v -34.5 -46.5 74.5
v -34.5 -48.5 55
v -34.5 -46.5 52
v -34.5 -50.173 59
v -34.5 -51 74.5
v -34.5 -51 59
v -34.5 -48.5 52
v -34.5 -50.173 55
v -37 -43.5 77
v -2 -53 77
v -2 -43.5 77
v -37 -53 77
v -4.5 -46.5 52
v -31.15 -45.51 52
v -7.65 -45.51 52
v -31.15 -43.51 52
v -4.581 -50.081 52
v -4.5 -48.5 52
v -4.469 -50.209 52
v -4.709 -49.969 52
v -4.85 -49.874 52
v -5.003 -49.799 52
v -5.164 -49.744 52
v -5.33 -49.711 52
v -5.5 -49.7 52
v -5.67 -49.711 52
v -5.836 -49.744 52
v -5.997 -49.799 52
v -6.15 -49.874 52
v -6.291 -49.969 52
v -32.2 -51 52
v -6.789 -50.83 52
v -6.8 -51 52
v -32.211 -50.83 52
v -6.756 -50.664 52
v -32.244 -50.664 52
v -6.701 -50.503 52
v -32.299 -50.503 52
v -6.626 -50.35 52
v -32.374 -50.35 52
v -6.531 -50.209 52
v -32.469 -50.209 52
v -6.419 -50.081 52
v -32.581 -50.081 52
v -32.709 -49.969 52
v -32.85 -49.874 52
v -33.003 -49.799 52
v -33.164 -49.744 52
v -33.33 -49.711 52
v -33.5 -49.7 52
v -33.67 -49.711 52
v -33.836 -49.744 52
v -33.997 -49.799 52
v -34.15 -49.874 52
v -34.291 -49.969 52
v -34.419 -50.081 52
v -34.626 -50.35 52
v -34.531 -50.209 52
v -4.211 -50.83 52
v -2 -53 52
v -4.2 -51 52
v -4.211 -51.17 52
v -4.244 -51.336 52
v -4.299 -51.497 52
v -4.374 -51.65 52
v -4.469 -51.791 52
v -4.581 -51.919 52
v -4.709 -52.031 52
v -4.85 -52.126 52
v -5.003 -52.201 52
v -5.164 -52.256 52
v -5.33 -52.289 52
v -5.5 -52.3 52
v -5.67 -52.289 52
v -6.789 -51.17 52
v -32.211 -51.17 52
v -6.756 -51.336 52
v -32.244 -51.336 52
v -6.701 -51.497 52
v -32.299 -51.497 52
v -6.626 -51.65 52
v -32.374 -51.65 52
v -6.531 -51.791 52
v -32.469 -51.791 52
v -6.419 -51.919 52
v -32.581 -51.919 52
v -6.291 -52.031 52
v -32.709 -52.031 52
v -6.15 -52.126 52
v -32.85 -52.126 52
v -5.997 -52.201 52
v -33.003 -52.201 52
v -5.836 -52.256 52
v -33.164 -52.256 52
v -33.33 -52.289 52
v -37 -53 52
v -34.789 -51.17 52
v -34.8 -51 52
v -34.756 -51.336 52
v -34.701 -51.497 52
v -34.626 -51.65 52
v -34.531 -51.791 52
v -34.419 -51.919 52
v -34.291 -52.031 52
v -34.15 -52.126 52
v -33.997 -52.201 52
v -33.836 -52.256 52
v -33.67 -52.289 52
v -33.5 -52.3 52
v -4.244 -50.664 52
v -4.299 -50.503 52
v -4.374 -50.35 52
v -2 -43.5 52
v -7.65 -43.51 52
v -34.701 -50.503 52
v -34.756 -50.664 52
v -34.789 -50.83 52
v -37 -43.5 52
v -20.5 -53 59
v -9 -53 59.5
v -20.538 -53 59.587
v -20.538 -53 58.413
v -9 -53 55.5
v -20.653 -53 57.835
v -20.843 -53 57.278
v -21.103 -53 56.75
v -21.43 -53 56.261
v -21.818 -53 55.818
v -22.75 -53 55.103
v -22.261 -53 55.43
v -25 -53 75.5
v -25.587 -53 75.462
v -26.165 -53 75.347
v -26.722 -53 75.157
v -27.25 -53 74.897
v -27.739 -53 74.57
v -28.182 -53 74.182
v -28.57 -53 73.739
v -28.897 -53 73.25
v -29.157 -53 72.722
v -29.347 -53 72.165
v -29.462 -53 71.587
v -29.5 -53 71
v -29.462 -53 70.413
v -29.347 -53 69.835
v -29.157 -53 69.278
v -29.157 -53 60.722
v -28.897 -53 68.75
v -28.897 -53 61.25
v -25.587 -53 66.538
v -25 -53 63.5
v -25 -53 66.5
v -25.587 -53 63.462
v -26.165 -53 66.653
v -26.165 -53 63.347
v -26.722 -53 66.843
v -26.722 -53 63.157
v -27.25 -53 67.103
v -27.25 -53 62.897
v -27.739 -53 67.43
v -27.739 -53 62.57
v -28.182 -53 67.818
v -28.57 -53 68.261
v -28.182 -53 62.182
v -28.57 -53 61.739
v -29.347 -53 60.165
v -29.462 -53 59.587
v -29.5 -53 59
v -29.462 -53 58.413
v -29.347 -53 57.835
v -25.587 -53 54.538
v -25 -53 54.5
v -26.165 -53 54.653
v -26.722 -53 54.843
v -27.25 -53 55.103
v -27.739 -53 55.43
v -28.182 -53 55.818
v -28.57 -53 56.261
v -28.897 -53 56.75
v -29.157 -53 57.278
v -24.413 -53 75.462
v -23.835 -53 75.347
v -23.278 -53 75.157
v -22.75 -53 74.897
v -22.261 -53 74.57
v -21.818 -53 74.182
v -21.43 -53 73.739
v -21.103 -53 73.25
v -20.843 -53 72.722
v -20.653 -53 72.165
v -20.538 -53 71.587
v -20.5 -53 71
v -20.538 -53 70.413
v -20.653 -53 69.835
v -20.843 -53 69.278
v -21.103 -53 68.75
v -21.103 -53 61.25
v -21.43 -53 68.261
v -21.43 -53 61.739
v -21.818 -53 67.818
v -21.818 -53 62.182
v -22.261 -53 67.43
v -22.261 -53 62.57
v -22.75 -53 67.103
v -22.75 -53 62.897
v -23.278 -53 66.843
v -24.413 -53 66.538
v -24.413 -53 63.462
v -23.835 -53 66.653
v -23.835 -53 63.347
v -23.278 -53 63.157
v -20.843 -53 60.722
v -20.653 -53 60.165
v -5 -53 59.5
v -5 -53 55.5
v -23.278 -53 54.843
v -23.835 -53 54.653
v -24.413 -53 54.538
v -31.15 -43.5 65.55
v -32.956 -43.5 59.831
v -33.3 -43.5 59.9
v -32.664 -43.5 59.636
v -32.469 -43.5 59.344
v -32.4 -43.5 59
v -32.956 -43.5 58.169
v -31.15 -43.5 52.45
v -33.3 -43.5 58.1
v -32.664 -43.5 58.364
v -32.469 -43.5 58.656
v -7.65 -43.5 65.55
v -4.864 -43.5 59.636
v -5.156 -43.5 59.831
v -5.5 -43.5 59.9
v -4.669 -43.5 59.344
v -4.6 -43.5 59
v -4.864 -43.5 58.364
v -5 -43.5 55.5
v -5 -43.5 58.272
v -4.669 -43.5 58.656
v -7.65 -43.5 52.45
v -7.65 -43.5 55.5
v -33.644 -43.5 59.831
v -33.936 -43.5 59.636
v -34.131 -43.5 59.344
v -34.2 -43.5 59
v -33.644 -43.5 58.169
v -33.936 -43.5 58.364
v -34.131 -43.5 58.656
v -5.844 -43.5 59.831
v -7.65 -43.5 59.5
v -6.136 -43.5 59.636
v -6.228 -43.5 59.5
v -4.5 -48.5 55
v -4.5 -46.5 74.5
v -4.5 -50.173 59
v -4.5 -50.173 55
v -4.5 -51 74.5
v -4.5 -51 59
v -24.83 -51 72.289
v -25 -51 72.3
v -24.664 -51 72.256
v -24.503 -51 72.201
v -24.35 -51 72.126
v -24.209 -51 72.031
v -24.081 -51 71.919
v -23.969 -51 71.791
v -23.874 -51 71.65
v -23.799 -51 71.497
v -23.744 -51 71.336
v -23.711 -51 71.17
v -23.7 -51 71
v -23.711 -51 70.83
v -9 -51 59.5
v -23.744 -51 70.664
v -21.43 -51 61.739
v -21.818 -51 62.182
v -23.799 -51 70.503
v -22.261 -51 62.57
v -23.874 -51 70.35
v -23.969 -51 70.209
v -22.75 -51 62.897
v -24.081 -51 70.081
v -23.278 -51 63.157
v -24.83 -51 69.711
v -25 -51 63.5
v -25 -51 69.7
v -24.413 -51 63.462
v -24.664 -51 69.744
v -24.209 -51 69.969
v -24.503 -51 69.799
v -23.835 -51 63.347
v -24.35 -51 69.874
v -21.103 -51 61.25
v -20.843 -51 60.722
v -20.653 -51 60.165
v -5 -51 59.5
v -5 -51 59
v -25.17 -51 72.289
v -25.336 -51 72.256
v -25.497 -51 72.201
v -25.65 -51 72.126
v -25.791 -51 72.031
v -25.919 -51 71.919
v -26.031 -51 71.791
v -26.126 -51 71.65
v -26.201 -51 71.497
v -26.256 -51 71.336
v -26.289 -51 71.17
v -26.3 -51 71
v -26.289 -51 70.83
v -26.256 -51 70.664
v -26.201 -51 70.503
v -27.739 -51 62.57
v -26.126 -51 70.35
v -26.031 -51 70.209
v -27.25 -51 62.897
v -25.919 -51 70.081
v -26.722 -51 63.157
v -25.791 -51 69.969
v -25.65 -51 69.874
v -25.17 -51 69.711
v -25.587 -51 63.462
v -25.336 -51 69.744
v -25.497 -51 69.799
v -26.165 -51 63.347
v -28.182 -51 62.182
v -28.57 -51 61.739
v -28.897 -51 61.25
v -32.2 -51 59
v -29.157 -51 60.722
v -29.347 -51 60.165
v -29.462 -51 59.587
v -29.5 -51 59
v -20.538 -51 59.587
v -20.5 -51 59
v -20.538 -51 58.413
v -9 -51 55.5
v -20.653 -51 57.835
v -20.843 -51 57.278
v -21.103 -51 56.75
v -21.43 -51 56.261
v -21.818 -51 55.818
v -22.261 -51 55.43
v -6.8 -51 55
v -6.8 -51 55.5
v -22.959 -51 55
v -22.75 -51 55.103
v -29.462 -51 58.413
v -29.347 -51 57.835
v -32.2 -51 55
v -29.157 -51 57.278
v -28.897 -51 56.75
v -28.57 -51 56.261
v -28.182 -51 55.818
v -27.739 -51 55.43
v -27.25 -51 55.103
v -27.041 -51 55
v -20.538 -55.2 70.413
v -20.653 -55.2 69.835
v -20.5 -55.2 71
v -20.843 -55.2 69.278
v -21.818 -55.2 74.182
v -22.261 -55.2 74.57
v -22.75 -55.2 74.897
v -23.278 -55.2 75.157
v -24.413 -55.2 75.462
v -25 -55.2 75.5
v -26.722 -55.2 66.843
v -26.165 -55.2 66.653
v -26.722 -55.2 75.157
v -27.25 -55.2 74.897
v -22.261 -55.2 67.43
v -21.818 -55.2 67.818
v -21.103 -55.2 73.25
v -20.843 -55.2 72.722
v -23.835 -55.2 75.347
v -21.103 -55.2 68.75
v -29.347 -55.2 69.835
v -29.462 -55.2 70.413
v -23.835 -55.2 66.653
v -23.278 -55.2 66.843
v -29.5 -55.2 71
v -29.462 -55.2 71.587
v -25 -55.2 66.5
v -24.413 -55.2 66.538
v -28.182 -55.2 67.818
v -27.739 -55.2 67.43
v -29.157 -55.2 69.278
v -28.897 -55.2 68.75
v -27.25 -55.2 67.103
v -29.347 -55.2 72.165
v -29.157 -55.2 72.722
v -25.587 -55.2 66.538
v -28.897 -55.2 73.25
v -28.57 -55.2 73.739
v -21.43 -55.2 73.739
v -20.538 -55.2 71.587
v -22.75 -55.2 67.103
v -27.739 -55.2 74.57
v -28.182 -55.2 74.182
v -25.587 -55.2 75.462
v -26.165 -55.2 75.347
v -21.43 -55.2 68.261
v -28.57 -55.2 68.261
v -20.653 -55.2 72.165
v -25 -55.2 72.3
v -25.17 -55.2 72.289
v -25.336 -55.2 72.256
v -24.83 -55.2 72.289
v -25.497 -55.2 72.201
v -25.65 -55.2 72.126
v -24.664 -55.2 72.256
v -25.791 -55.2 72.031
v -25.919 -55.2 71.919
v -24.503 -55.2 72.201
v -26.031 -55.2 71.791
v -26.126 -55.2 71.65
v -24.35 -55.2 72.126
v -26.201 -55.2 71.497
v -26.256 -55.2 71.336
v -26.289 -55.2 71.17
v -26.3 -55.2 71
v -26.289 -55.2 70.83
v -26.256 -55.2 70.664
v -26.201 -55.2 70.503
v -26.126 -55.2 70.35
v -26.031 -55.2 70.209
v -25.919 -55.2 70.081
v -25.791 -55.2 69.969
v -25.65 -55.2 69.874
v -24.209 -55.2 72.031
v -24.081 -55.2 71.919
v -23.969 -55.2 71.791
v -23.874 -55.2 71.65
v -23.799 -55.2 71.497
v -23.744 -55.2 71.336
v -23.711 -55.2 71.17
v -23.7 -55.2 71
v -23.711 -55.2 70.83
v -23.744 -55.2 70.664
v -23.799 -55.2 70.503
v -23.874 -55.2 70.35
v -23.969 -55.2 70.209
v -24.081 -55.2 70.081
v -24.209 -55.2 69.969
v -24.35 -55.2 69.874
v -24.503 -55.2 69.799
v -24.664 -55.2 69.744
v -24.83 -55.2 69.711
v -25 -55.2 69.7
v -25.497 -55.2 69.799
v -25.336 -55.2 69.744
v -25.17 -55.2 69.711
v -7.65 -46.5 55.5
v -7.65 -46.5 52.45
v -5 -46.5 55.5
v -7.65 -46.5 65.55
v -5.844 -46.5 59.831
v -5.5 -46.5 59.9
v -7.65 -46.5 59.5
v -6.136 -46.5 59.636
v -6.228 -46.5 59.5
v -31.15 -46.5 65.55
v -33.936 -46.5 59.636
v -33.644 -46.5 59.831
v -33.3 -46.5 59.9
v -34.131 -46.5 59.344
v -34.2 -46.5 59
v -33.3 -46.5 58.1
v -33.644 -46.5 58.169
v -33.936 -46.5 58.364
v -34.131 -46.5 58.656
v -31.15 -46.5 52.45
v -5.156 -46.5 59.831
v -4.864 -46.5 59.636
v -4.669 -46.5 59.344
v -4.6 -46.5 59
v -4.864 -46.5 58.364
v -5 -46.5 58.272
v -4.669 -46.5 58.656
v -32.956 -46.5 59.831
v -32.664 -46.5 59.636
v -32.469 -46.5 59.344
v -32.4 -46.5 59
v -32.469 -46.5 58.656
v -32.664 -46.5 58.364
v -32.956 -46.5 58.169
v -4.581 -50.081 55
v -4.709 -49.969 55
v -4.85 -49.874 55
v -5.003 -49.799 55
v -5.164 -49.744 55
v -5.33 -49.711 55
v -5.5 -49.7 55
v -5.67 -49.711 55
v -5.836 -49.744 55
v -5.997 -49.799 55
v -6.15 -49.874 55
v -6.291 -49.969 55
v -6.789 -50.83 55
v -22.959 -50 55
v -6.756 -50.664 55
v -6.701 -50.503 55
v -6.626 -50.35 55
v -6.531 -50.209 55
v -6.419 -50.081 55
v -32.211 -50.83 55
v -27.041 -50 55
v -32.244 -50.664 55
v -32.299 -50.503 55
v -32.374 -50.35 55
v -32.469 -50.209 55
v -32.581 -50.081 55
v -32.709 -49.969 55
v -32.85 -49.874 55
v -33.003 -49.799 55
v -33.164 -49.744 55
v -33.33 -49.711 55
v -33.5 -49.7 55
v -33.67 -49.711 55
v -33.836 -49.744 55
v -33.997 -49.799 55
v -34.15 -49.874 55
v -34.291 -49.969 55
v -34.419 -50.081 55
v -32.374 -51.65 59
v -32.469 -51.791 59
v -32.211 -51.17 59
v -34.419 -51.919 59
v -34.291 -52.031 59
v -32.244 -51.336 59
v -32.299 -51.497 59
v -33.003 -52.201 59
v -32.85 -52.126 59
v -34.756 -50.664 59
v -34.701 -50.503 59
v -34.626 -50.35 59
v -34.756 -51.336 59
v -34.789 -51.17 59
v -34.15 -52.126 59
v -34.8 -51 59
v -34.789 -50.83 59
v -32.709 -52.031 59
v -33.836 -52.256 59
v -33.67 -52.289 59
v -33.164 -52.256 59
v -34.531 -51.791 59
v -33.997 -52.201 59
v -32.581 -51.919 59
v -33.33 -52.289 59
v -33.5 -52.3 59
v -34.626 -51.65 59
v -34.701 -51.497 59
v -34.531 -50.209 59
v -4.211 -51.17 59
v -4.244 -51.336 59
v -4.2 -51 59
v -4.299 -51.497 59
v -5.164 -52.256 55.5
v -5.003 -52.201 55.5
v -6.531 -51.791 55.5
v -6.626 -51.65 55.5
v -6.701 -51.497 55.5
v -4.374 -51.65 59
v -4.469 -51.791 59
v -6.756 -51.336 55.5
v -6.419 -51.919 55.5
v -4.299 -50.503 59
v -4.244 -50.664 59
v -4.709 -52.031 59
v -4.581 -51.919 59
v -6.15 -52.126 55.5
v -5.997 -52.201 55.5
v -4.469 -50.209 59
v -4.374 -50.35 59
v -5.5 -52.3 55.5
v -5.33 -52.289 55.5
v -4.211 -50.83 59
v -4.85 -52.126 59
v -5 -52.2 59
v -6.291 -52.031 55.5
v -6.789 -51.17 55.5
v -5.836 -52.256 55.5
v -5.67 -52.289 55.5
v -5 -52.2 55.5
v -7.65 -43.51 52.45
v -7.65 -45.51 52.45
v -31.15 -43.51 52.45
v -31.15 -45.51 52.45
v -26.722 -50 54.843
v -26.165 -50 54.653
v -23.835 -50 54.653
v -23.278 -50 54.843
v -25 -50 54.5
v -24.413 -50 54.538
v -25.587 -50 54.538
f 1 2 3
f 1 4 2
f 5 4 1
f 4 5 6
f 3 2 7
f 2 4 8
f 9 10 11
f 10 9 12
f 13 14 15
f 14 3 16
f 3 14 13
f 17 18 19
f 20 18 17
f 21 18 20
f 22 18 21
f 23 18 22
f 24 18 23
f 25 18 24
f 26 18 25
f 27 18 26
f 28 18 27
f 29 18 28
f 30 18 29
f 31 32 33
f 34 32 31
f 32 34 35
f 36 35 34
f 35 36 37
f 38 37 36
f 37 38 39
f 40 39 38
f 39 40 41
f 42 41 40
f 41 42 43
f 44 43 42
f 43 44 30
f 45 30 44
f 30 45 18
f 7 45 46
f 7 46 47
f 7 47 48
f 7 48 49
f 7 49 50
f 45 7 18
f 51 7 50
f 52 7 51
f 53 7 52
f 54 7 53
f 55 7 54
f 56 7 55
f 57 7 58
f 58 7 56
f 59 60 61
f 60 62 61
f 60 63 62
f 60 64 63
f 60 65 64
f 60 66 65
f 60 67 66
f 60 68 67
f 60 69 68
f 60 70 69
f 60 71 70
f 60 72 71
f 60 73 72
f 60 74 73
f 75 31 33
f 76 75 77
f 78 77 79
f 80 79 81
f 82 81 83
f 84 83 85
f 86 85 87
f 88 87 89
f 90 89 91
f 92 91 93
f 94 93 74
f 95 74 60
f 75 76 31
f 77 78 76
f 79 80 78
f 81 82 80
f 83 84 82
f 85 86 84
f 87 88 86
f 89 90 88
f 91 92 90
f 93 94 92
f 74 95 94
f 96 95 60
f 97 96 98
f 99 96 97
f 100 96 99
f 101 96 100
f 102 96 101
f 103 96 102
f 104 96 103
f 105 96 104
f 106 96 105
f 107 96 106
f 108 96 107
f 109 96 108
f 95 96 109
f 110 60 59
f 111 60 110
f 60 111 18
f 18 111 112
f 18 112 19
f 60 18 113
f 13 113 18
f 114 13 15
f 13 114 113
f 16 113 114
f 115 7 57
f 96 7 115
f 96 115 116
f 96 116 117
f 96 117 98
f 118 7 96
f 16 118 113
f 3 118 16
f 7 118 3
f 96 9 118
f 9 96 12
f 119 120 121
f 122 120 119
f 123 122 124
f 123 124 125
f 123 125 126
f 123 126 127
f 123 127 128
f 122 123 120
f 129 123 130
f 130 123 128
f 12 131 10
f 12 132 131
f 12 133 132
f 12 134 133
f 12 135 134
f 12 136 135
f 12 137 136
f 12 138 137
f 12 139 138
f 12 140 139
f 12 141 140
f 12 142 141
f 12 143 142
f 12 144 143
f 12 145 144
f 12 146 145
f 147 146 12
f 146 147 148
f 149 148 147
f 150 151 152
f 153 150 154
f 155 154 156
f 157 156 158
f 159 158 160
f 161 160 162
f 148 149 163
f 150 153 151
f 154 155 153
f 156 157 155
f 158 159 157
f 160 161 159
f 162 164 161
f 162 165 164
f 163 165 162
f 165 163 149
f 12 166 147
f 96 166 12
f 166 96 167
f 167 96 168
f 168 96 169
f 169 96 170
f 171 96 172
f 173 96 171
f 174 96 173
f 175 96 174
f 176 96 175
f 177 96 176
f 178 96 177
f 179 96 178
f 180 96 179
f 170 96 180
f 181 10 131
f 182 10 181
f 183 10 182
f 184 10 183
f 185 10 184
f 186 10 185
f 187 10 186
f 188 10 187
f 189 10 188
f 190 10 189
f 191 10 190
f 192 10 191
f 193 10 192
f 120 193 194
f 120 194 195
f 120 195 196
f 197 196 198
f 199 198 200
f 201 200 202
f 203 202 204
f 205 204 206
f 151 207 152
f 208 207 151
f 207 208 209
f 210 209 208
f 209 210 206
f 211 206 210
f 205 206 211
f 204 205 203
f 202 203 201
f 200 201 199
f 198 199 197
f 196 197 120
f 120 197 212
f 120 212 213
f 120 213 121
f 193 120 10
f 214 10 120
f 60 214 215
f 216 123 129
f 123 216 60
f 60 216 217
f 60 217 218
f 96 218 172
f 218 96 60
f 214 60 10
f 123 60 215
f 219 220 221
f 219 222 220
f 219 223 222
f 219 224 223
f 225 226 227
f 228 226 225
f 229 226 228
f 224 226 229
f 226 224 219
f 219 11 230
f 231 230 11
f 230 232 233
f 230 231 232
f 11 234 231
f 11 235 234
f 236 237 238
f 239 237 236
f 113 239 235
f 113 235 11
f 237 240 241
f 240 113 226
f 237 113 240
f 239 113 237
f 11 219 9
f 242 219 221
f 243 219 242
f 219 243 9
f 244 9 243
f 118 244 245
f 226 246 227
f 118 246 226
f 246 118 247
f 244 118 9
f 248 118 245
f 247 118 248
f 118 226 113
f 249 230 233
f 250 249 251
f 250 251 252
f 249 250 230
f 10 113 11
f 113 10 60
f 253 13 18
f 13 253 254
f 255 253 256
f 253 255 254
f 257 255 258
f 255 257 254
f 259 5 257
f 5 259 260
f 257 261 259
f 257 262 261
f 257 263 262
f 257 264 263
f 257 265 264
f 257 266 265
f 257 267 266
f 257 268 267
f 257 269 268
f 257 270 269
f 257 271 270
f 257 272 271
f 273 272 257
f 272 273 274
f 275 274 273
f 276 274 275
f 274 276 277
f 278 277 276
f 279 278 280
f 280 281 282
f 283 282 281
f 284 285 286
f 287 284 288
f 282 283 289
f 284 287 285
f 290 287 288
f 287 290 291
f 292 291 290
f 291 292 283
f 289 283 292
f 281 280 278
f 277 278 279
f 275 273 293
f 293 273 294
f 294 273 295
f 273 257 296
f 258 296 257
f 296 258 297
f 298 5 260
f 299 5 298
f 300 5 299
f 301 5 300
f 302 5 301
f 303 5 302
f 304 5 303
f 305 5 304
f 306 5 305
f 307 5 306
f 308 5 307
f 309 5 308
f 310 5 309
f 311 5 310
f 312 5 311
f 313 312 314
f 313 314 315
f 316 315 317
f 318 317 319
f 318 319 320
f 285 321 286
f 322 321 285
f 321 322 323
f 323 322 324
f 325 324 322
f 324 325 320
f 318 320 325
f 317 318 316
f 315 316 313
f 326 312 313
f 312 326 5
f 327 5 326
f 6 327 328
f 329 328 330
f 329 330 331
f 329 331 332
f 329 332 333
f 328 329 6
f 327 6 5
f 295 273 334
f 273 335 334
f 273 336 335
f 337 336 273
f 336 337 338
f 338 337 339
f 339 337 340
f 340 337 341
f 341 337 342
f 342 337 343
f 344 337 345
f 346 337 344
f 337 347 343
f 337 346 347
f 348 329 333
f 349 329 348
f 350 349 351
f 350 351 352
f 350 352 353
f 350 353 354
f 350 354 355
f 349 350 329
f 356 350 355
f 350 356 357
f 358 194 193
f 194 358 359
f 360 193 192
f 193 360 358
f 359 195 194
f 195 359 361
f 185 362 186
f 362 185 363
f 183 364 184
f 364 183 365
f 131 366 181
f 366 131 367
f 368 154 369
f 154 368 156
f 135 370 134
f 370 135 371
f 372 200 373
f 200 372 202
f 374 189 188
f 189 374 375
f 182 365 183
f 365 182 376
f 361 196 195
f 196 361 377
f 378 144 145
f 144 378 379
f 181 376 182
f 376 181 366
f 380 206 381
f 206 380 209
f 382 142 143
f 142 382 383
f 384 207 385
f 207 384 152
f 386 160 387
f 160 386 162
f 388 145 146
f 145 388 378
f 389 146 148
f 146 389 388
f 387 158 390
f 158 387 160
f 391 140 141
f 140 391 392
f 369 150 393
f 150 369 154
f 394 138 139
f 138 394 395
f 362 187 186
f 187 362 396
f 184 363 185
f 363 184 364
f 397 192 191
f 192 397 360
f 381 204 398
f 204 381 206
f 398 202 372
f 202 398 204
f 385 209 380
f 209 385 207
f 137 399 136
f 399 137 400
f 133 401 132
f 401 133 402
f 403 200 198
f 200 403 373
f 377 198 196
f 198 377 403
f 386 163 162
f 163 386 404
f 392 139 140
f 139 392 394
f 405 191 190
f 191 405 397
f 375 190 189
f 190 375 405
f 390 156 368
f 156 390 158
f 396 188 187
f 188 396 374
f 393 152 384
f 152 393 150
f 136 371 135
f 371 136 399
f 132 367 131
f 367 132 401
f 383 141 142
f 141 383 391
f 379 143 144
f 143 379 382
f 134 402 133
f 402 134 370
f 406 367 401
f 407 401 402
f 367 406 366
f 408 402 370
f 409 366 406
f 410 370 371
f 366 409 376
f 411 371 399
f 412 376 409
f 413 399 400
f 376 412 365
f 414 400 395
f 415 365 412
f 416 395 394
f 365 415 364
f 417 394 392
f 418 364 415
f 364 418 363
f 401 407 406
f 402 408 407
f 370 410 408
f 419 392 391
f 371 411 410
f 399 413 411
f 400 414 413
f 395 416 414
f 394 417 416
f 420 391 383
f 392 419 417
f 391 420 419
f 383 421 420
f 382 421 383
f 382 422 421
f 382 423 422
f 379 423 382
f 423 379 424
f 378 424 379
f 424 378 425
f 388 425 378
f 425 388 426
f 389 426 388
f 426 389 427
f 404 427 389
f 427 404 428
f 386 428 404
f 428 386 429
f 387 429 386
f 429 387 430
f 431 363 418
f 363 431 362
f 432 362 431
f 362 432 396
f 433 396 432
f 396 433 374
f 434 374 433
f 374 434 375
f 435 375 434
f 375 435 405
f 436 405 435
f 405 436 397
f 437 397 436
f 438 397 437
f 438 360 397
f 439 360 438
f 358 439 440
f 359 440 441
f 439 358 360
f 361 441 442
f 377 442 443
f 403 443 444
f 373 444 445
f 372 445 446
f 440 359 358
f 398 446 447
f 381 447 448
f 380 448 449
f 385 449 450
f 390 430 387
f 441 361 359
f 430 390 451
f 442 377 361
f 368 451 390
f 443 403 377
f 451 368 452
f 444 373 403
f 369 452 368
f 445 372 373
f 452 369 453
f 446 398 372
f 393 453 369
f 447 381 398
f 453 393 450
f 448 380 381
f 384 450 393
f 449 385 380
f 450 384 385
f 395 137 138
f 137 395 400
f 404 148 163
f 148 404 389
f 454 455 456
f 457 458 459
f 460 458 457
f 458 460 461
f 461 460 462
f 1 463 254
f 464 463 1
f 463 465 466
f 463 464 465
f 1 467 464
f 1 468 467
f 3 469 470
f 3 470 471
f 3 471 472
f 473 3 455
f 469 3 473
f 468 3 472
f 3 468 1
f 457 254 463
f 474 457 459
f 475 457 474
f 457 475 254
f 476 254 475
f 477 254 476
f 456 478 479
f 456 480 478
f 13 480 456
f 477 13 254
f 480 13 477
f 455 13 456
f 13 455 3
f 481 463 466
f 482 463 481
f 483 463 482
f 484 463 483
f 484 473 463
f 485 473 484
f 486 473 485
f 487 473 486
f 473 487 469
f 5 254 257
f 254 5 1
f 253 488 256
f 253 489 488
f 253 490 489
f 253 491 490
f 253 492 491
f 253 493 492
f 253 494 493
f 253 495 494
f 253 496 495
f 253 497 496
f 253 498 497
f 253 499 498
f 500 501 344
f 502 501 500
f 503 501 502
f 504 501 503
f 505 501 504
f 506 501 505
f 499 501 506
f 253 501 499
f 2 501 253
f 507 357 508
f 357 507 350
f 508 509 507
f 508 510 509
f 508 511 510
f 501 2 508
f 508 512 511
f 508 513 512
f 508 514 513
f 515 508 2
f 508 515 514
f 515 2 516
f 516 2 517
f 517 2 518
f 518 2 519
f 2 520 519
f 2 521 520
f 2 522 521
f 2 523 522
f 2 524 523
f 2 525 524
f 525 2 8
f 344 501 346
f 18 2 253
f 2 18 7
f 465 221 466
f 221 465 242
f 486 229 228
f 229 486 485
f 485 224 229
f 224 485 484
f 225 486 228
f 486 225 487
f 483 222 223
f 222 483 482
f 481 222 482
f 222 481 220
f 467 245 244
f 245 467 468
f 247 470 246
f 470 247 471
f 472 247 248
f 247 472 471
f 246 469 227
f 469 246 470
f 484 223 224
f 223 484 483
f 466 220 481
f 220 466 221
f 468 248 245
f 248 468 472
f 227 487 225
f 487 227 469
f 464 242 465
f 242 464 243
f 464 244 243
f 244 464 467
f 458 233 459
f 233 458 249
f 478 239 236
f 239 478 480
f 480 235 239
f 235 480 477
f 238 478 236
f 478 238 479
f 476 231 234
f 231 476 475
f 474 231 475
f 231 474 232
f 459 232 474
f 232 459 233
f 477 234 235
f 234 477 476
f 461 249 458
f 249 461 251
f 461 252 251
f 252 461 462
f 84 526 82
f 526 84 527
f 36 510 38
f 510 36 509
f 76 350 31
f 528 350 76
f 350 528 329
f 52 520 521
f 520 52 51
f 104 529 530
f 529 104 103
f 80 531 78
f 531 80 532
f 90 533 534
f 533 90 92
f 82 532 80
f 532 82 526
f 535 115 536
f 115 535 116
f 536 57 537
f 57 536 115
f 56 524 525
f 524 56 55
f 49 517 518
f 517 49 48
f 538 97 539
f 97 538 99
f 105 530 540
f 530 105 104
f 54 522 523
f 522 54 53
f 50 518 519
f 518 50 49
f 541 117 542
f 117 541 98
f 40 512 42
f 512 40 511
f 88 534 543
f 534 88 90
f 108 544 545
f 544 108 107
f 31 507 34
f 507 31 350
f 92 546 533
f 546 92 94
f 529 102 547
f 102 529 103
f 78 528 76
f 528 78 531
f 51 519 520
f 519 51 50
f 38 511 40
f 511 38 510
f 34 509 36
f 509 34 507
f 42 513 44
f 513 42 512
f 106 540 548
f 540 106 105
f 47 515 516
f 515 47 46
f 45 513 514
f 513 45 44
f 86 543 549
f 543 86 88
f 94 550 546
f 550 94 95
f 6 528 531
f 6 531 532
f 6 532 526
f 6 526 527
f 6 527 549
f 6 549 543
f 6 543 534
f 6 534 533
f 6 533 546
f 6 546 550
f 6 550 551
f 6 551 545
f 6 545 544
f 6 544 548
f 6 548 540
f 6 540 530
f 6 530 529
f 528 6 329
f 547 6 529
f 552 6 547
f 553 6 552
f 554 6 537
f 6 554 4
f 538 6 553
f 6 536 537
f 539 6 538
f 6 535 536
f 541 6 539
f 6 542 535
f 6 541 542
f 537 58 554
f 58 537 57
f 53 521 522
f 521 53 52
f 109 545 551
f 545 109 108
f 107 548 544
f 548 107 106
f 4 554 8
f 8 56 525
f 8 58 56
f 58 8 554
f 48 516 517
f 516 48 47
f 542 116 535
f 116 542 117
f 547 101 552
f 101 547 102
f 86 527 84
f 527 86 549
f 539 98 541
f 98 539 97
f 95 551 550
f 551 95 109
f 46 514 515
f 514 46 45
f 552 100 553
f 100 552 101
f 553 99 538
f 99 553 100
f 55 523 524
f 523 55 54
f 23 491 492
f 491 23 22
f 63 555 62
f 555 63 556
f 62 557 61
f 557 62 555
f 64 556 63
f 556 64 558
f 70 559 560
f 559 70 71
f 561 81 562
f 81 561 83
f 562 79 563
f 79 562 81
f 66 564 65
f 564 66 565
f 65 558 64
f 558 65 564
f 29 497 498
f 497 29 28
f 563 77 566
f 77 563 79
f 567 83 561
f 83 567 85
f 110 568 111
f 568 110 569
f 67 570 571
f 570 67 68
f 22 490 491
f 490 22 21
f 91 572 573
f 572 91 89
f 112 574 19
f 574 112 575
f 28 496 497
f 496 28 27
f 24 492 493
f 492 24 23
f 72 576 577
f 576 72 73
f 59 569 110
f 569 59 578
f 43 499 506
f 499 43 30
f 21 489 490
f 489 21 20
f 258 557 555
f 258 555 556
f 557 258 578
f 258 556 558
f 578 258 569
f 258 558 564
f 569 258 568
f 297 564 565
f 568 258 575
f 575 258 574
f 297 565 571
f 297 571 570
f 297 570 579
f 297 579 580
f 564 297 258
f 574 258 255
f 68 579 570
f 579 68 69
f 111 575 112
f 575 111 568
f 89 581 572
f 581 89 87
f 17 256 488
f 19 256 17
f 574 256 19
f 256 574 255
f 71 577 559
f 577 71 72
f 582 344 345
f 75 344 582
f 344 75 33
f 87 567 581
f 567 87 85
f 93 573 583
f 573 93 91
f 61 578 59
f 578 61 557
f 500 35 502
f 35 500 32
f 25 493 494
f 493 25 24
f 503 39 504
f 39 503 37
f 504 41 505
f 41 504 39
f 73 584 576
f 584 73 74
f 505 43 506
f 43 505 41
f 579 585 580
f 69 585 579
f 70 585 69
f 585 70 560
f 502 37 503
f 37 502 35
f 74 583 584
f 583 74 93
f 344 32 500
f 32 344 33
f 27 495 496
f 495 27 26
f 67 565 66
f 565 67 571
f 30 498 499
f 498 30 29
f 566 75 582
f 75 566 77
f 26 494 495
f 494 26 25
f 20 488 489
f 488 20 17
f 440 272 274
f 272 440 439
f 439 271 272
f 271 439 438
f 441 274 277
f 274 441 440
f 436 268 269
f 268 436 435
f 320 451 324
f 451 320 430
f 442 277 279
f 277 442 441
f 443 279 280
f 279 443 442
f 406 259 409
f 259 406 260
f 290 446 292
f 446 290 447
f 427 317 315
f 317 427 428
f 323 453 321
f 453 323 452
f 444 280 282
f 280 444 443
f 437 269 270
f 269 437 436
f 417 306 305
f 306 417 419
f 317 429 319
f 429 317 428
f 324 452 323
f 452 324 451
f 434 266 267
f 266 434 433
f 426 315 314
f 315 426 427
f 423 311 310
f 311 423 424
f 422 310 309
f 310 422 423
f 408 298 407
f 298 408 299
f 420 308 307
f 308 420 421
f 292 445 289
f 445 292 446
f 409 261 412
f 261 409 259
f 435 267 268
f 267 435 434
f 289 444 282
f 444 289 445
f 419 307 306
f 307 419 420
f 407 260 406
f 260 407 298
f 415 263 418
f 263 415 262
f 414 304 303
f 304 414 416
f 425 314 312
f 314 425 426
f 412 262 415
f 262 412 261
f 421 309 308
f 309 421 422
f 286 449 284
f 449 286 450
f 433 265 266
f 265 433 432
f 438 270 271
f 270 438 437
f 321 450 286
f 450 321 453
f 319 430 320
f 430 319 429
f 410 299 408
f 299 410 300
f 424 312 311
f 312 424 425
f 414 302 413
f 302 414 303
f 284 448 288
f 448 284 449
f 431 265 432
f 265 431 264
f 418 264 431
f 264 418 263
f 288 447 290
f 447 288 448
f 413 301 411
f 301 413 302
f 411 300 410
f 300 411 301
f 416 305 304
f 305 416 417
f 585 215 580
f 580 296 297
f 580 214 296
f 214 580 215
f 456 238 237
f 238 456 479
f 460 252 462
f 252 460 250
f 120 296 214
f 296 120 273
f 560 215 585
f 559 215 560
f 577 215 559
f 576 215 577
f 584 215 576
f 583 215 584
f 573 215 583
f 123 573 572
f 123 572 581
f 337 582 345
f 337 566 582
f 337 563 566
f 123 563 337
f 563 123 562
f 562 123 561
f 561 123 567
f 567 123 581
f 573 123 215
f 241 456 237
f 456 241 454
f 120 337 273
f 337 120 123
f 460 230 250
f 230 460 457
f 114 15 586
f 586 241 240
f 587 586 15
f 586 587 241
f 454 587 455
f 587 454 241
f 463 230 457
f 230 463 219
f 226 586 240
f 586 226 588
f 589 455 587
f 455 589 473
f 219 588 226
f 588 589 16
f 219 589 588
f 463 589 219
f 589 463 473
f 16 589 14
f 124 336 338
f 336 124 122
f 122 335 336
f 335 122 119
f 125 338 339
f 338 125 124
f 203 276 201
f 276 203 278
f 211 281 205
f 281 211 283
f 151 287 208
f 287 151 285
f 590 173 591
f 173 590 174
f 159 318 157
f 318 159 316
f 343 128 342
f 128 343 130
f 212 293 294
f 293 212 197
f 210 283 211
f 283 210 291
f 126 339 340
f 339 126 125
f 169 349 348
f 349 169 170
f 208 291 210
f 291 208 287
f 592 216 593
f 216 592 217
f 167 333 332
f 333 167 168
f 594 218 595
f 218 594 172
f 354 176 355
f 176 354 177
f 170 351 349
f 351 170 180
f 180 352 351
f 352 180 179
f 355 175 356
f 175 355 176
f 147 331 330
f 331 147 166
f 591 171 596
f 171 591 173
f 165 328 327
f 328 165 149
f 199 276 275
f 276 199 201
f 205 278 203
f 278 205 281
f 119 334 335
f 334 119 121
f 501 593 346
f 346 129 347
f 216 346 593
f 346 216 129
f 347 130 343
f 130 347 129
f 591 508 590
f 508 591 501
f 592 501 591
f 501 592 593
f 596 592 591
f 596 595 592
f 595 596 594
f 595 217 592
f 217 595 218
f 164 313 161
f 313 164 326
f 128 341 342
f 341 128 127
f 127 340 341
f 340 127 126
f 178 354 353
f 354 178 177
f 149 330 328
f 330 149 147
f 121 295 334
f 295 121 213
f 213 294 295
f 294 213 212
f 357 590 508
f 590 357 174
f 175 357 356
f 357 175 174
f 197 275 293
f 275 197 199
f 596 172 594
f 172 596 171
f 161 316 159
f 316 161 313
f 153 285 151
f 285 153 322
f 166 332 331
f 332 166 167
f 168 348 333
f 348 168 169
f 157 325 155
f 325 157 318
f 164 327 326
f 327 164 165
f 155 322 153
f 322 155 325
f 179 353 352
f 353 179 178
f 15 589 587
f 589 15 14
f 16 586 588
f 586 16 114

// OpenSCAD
// file: params.scad
// ===========================================================================
//  Cozmo replica - shared dimensions for every printed part
//  Units: mm.  Robot frame: x = forward, y = left, z = up, origin = ground
//  centre.  Change values here, then re-export with hardware/3d/export.sh.
// ===========================================================================

$fn = 48;
eps = 0.01;
clr = 0.25;            // general printing clearance

// ---------------------------------------------------------------- fasteners
m3_hole      = 3.3;    // clearance hole
m3_tap       = 2.6;    // self-tapping into plastic
m3_nut_af    = 5.7;    // nut across flats (+clearance)
m3_nut_h     = 2.6;
m2_tap       = 1.8;
pin_hole     = 1.95;   // 1.75 mm filament used as track pins

// ---------------------------------------------------------------- tracks
pitch        = 8;      // track link pitch
teeth        = 12;     // sprocket teeth = links wrapped per revolution
link_t       = 3.6;    // link thickness (= hinge barrel diameter)
link_w       = 16;     // link width
grouser_h    = 1.2;    // tread ridge height
r_pin        = (pitch / 2) / sin(180 / teeth);    // pin circle radius (15.45)
axle_z       = r_pin + link_t / 2 + grouser_h;    // axle height (18.45)
wheelbase    = 56;     // with 26 links per side: 2*56 + 12*8 = 208 = 26*8
links_per_side = 26;
axle_x_rear  = -wheelbase / 2;   // drive sprocket (motor)
axle_x_front =  wheelbase / 2;   // idler

// ---------------------------------------------------------------- chassis tub
wall         = 2;
tub_len      = 86;
tub_w        = 70;
tub_z0       = 8;      // ground clearance
tub_h        = 42;     // tub top at z = 50
tub_r        = 6;      // vertical corner radius
floor_t      = 2;
tub_top      = tub_z0 + tub_h;
track_y      = tub_w / 2 + 1 + link_w / 2;        // 44: track centre line

// ---------------------------------------------------------------- N20 motor
n20_w        = 12.2;   // gearbox width (z when mounted)
n20_h        = 10.2;   // gearbox height
n20_len      = 33;     // gearbox + motor + encoder
n20_shaft_d  = 3;
n20_shaft_flat = 2.5;  // D-shaft flat
n20_shaft_len = 10;

// ---------------------------------------------------------------- servos (SG90 / MG90S)
servo_l      = 23.0;   // body length
servo_w      = 12.6;   // body width
servo_h      = 22.8;   // body height (to tab underside ~15.9)
servo_tab_l  = 32.6;   // length over mounting tabs
servo_tab_t  = 2.6;
servo_tab_z  = 15.9;   // tab underside from body bottom
servo_shaft_off = 5.9; // output shaft centre from body end
servo_shaft_h = 28.5;  // body bottom to top of spline

// ---------------------------------------------------------------- OLED
// Default: 1.3" I2C module (SH1106). For a 0.96" module set oled_096 = true
// (and OLED_IS_SH1106 = false in firmware/include/config.h).
oled_096     = false;
oled_pcb     = oled_096 ? [27.4, 27.8] : [35.6, 33.8];  // w x h
oled_view    = oled_096 ? [23.0, 12.0] : [30.0, 15.4];  // visible window
oled_view_dz = oled_096 ? 3.6 : 2.6;   // window centre above PCB centre
oled_pcb_t   = 1.7;
oled_glass_t = 1.6;
oled_hole_d  = 2.2;
oled_hole_in = oled_096 ? 2.0 : 2.3;   // hole centre from PCB edges

// ---------------------------------------------------------------- head
head_w       = 56;     // y
head_d       = 36;     // x
head_h       = 44;     // z
head_r       = 7;
head_wall    = 1.8;
head_pivot   = [6, 0, 72];     // pivot axis position in robot frame
head_below   = 12;     // head bottom is this far below the pivot
cheek_t      = 3;

// ---------------------------------------------------------------- lift (parallel 4-bar)
lift_pivot_x = -25;
lift_pivot_lo_z = 59;
lift_pivot_hi_z = 71;
lift_link_len = 80;
lift_link_y  = 57.5;   // link centre plane (outside the tracks + servo horn)
lift_link_t  = 4;
lift_link_h  = 7;
carrier_drop = 28;     // carrier extends this far below the lower pin
fork_y       = 15;     // forks at +-fork_y
fork_len     = 16;

// ---------------------------------------------------------------- misc parts
battery      = [52, 36, 11];   // 1S LiPo 103450 bay (l, w, h)
speaker_d    = 28.5;           // 28 mm 8 ohm speaker
speaker_t    = 5;
switch_slot  = [8.8, 4.2];     // SS12D00 slide switch
usbc_slot    = [9.6, 3.8];     // TP4056 USB-C charging port
led_count    = 4;
led_pitch    = 7;              // WS2812 spacing on the backpack bar

// ---------------------------------------------------------------- helpers
module rounded_box(size, r, center = false) {
  // Box with rounded vertical edges.
  translate(center ? [-size[0] / 2, -size[1] / 2, -size[2] / 2] : [0, 0, 0])
    hull() for (x = [r, size[0] - r], y = [r, size[1] - r])
      translate([x, y, 0]) cylinder(r = r, h = size[2]);
}

module rounded_cube(size, r) {
  // Box with every edge rounded (centred).
  hull() for (x = [-1, 1], y = [-1, 1], z = [-1, 1])
    translate([x * (size[0] / 2 - r), y * (size[1] / 2 - r), z * (size[2] / 2 - r)])
      sphere(r = r, $fn = 24);
}

module hex_nut_pocket(h = m3_nut_h) {
  cylinder(d = m3_nut_af / cos(30), h = h, $fn = 6);
}
// main file
// ===========================================================================
//  Lift towers: stand on the cover wings and carry the 4-bar lift pivots.
//  side = "right": holds the lift servo (MG90S); its spline drives the lower
//                  link directly through the outer plate.
//  side = "left":  two M3 pivots for the passive links.
//  Print lying on the outer plate (largest flat face), no supports.
// ===========================================================================
include <params.scad>

side = "right";

zb = tub_top + 2;                  // wing top (52)
px = lift_pivot_x;
zl = lift_pivot_lo_z;
zh = lift_pivot_hi_z;
ear_y = [51, 53];                  // outer plate (|y|)
inner_y = [43.5, 46.5];            // servo tab plate (|y|)
x_range = [px - 12, px + 23];      // [-37, -2]
top_z = zh + 6;

// Servo body (frame of the robot, right side = -y, spline pointing -y)
servo_body_x = [px - servo_shaft_off, px - servo_shaft_off + servo_l];
servo_tab_xc = (servo_body_x[0] + servo_body_x[1]) / 2;

module frame() {
  // Outer plate with pivot bosses
  translate([x_range[0], ear_y[0], zb]) cube([x_range[1] - x_range[0], ear_y[1] - ear_y[0], top_z - zb]);
  for (z = (side == "right") ? [zh] : [zl, zh])
    translate([px, ear_y[0], z]) rotate([-90, 0, 0]) cylinder(d = 9, h = lift_link_y - lift_link_t / 2 - ear_y[0] - 0.3);
  // Inner plate
  translate([x_range[0], inner_y[0], zb]) cube([x_range[1] - x_range[0], inner_y[1] - inner_y[0], top_z - zb]);
  // End walls + roof tie the plates together
  for (x = [x_range[0], x_range[1] - 2.5])
    translate([x, inner_y[0], zb]) cube([2.5, ear_y[1] - inner_y[0], top_z - zb]);
  translate([x_range[0], inner_y[0], top_z - 2.5]) cube([x_range[1] - x_range[0], ear_y[1] - inner_y[0], 2.5]);
  // Feet with M3 holes (match the cover wing holes)
  translate([x_range[0], 48.5, zb]) cube([x_range[1] - x_range[0], ear_y[1] - 48.5, 3]);
}

module tower_right_frame() {
  difference() {
    frame();
    // Servo body passes through the inner plate (tabs rest on its -inner face)
    translate([servo_body_x[0] - clr, inner_y[0] - 1, zl - servo_w / 2 - clr])
      cube([servo_l + 2 * clr, inner_y[1] - inner_y[0] + 2, servo_w + 2 * clr]);
    // Tab screws
    for (dx = [-13.9, 13.9])
      translate([servo_tab_xc + dx, inner_y[0] - 1, zl]) rotate([-90, 0, 0]) cylinder(d = m2_tap, h = 6, $fn = 16);
    // Spline + horn hub clearance through the outer plate
    translate([px, ear_y[0] - 1, zl]) rotate([-90, 0, 0]) cylinder(d = 9, h = 5);
    // The feet and end wall must not block the servo body
    translate([servo_body_x[0] - clr, inner_y[0] + eps, zb - 1]) cube([servo_l + 2 * clr, 2, zl - zb + 7]);
    common_holes();
  }
}

module tower_left_frame() {
  difference() {
    frame();
    for (z = [zl, zh]) translate([px, ear_y[0] - 1, z]) rotate([-90, 0, 0]) cylinder(d = m3_tap, h = 20);
    common_holes();
  }
}

module common_holes() {
  // Upper pivot
  translate([px, ear_y[0] - 1, zh]) rotate([-90, 0, 0]) cylinder(d = m3_tap, h = 20);
  // Feet screws (self-tap from below through the cover)
  for (x = [px - 8.5, px + 19.5]) translate([x, 51, zb - 1]) cylinder(d = m3_tap, h = 8);
  // Cable pass for the servo lead
  translate([x_range[1] - 7, inner_y[0] - 1, zb + 3.5]) cube([4, 12, 4]);
}

// Built for the +y (left) side; the right tower is mirrored to -y.
if (side == "left") {
  tower_left_frame();
} else {
  mirror([0, 1, 0]) tower_right_frame();
}
